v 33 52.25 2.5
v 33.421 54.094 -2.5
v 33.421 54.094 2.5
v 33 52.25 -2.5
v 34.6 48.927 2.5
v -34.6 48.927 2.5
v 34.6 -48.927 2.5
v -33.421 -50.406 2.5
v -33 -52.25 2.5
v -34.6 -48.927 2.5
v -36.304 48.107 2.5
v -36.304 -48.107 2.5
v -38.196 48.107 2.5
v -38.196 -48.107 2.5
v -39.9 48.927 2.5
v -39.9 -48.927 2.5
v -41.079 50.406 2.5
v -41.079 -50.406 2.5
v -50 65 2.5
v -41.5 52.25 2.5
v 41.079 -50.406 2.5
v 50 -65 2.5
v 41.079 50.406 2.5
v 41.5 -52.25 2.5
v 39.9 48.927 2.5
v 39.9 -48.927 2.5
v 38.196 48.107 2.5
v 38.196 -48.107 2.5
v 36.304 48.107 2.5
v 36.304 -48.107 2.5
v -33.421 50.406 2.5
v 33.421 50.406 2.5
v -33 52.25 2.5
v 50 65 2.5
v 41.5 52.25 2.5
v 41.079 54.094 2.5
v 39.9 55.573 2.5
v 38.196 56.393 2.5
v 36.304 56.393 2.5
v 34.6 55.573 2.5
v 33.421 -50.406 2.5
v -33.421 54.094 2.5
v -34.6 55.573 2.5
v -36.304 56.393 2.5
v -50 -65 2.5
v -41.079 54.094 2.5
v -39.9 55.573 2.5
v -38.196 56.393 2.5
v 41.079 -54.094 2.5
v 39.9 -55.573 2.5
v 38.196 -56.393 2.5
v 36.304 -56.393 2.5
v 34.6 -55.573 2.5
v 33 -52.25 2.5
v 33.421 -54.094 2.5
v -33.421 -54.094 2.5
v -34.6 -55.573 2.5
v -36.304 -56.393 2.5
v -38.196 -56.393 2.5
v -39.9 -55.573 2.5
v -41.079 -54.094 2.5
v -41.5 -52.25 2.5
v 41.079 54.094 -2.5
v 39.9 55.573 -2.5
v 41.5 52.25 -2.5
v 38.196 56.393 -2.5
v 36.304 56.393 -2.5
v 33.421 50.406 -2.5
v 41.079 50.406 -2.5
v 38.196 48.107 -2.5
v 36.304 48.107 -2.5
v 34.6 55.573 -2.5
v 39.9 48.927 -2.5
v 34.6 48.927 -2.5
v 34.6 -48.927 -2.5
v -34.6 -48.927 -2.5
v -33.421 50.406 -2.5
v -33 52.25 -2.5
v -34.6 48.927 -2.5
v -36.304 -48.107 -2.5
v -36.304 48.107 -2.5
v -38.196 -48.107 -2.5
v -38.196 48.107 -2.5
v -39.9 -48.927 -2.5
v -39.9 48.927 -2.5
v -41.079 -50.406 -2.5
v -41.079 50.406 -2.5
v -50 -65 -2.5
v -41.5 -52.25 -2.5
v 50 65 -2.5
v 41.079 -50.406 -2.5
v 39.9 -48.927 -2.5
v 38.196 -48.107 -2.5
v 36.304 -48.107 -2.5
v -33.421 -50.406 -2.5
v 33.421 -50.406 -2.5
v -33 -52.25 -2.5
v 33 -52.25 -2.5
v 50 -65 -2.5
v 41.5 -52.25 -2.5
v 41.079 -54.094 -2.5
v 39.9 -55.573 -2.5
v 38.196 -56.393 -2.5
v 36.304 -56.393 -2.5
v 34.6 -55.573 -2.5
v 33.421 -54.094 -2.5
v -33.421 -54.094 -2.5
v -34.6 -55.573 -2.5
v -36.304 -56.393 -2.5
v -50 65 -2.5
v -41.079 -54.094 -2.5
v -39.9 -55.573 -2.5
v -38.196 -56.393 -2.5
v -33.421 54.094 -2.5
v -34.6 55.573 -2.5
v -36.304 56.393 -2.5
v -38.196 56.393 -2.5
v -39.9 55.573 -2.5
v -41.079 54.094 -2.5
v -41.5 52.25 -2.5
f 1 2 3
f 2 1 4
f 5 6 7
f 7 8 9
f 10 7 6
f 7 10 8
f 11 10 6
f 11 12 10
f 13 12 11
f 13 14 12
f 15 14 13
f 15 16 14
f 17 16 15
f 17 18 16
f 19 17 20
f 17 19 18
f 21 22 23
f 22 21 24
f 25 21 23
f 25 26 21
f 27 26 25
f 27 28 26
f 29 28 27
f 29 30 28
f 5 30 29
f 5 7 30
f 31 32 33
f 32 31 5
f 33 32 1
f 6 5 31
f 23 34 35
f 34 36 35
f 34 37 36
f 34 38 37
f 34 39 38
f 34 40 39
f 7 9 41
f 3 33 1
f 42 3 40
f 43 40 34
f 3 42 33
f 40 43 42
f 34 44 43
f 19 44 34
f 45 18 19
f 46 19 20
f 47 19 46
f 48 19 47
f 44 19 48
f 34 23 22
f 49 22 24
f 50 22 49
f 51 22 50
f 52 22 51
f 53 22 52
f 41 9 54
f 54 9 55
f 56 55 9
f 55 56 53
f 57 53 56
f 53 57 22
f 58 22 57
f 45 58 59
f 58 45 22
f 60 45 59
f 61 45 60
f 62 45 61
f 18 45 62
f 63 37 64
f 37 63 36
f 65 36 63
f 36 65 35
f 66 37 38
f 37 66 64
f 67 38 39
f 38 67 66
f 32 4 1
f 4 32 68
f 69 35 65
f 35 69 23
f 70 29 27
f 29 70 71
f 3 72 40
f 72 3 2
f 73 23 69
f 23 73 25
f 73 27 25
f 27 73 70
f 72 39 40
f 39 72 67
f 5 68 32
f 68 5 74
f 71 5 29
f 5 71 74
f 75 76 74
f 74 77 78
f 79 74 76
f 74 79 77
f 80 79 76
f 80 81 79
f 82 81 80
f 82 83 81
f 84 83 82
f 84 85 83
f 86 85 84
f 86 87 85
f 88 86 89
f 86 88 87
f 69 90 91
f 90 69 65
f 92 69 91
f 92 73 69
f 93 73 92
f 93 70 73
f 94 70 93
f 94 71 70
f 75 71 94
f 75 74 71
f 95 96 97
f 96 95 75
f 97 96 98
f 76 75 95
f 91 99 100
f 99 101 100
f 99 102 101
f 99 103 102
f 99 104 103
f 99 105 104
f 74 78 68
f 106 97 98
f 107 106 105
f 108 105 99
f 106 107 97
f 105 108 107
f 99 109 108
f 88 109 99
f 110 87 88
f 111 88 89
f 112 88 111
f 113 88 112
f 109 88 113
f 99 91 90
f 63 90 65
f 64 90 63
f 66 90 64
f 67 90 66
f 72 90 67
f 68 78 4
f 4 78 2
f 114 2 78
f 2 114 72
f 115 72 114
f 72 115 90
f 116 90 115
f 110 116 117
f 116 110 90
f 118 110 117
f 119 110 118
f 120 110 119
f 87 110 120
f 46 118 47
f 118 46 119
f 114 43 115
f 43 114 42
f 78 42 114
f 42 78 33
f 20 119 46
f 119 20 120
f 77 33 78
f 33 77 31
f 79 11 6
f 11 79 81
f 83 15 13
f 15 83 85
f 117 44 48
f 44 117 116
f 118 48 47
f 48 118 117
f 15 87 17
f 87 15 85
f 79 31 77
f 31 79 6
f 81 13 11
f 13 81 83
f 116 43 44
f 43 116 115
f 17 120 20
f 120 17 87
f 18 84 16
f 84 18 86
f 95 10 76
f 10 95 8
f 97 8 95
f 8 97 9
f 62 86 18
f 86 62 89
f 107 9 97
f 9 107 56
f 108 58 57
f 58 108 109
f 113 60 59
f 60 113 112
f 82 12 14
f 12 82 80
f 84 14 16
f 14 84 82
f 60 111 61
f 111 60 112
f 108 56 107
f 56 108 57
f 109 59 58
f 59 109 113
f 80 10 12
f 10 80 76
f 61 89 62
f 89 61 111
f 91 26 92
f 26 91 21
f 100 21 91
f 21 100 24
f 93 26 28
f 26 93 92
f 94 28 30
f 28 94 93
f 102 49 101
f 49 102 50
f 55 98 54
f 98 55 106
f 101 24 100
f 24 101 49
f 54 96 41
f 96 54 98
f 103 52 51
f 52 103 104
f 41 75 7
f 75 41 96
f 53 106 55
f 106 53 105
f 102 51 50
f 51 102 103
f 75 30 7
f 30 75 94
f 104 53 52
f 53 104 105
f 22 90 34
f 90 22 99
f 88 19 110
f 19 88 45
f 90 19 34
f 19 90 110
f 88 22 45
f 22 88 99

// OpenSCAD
// Generated by SolidPython 1.1.3 on 2023-10-18 15:46:59


difference() {
	cube(center = true, size = [100, 130.0000000000, 5]);
	union() {
		translate(v = [37.2500000000, 52.2500000000]) {
			cylinder(center = true, h = 5, r = 4.2500000000);
		}
		translate(v = [-37.2500000000, 52.2500000000]) {
			cylinder(center = true, h = 5, r = 4.2500000000);
		}
		translate(v = [-37.2500000000, -52.2500000000]) {
			cylinder(center = true, h = 5, r = 4.2500000000);
		}
		translate(v = [37.2500000000, -52.2500000000]) {
			cylinder(center = true, h = 5, r = 4.2500000000);
		}
	}
}
/***********************************************
*********      SolidPython code:      **********
************************************************
 
import solid
import numbers
import pudb
from solid.utils import *
import viewscad
import subprocess
import os
import os.path as osp
import math
import sys

chamfer_extrude=solid.import_scad("./chamfer_extrude.scad")
chamfer_extrude=chamfer_extrude.chamfer_extrude
r = viewscad.Renderer(width=800, height=800)

def debug(model,f_name,path="/home/ts/code/projects/mfd/designs/debug"):
    solid.scad_render_to_file(model,osp.join(path,f_name)+".scad")
#generate position list of wells using offset from center
wells_pos_from_center_4 = lambda offset: [[-offset,offset],
                                        [offset, offset],
                                        [-offset, -offset],
                                        [offset, -offset]]
#wells_pos_from_center_2 = lambda offset: [[0,offset],
#                                        [0, -offset]]
wells_pos_from_center_2 = lambda offset: [[offset,0],
                                        [-offset,0]]

def make_well(dims,shape=None,height=None,dxf=False):
    def circle_cylinder():
        if dxf or (height is None):
            well = solid.circle(r=dims, segments=64)
        else:
            well = solid.cylinder(r=dims, h=height, segments=64, center = True)
        return well
    if dims is None:
        sys.exit("radius needs to be a number")
    if isinstance(dims, numbers.Number):
        well =circle_cylinder()
    elif len(dims)==1:
        if isinstance(dims[1], numbers.Number):
            well =circle_cylinder()
        else:
            sys.exit("radius needs to be a number")
    elif len(dims)==2:
        well = solid.square(dims,center = True)
    elif len(dims)==3:
        well = solid.cube(dims, center = True)
    return well

def wells_top_bottom(center_gap,device_dims=None,shape=None,height=None, positions = None, dxf = False,well_shape=None):
    if well_shape == None:
        well_shape = make_well(device_dims,shape=shape,height=height,dxf=dxf)
    wells = []
    if positions is None:
        offset = radius+radius/2.0
        positions = wells_pos_from_center_2(offset)
    if dxf or (height is None):
        height = 0
    for position in positions:
        if dxf:
            wells.append(solid.translate([position[0],position[1]])(well_shape))
        else:
            wells.append(solid.translate([position[0],position[1],height/2.0])(well_shape))
    return  union()(*wells)

#place wells in four corners 
def four_corner(radius,height=None, positions = None, dxf = False):
    #if well pos not specified set
    #to equally spaced by half radius
    if positions is None:
        offset = radius+radius/2.0
        positions = wells_pos_from_center_4(offset)
    if dxf or (height is None):
        height = 0
    #make wells at positions with specified radius and height
    wells = []
    for position in positions:
        #make circle if making dxf
        if dxf:
            well_shape = solid.circle(r=radius, segments=64)
            well_shape = solid.translate([position[0],position[1]])(well_shape)
        #if stl make cylinder
        else:
            well_shape = solid.cylinder(r=radius, h=height, segments=64, center = True)
            well_shape = solid.translate([position[0],position[1],height/2.0])(well_shape)
        wells.append(well_shape)
    return  union()(*wells)

#generate channels 
def make_channels(length,width,height=0,num_chans=1,max_chans=None,spacing=None, dxf = False,
                  rotate_channels=False):
    if dxf or (height is None):
        height = 0
    #if channel gap not defined, is equal to
    if spacing is None: spacing = width
    #calculate number of channels if fitting max num within given width
    if not max_chans is None:
        import math
        num_chans = math.floor((max_chans-spacing)/(width+spacing))
    #get total width of channel section  
    total_width = (width*num_chans)+(spacing*(num_chans-1))

    #make template channel
    #if rotate_channels: width, length = length, width
    if dxf:
        channel_t = solid.square([length,width],center = True)
    else:
        channel_t = solid.cube([length,width,height], center = True)

    #if number channels is even, offset the first channel to center its gap
    if num_chans % 2 == 0: centering = -(width/2.0+spacing/2.0)
    else: centering = 0
    #move template channel up to align bottom at z = 0 
    #and offset center if necessary
    if dxf:
        channel_t = solid.translate([0,centering])(channel_t)
    else:
        channel_t = solid.translate([0,centering,height/2.0])(channel_t)

    #if rotate_channels: length,width = width,length
    #start making the channels
    channels = []
    for i in range(num_chans):
        #if i=0 there is no translation
        #if i=1, we make the first channel adjacent to second
        direction = i

        #if i>=1, we add channels alternating left and right
        if i >= 1:
            direction = -(i/2.0)
            if i % 2 == 1: direction = (-direction)+0.5
                
        #make channel at right position and add it to channel list
        translation_coords = [0,direction*(width+spacing)]
        #if rotate_channels: translation_coords = [direction*(width+spacing),0]
        if dxf:
            channel = solid.translate(translation_coords)(channel_t)
        else:
            channel = solid.translate([*translation_coords,0])(channel_t)
        channels.append(channel)
    
    #group all channels as one object
    channels = union()(*channels)
    #compute the x,y,z dimensions in order to pass as arguments 
    #for construction of other parts of device (such as the chambers)
    measurements = {'x':(length/2.0,-length/2.0),
                    'y':(total_width/2.0,-total_width/2.0)}
    if not dxf:
        measurements['z'] = (height,0)
    if rotate_channels:
        channels = solid.rotate(90)(channels)
        measurements['x'],measurements['y']=measurements['y'],measurements['x']
    return channels,measurements

def make_chambers(msrs,height=None,extra=0,len_until=None,width=None, dxf = False):
    #computes x,y,z length
    total = lambda x : abs(x[0]) + abs(x[1])
    
    #if specific height if specified
    #otherwise use same height as channels
    if dxf:
        pass
    elif not height is None:
        msrs['z'] = (height,0)
    else:
        msrs['z'] = (0,0)
        
    #make copy of measurements from channels to modify chamber dimensions 
    #and add length to chambers as specified
    chamber_dims = msrs.copy()
    #calculate length of chamber to reach specified offset
    if not len_until is None:
        chamber_len = len_until-(msrs['x'][0])
    #or add specified length to channel length (if not specified, adds 0)
    else:
        chamber_len = msrs['x'][0]+extra
    #set the chamber length based 
    chamber_dims['x'] = (chamber_len/2.0,-(chamber_len/2.0))
    #compute final dimensions of chamber
    if not width is None:
        chamber_dims['y'] = (width/2.0,-width/2.0)
    chamber_dims = [total(size) for size in chamber_dims.values()]
        
    #calculate chamber translation offset to place adjacent to channels
    chamber_trslt = msrs['x'][0]+(chamber_len/2.0)
    #compute chamber translation coordinates to align with channels
    #x = 1 moves chamber above channels
    #x = -1 moves chamber below channels
    if dxf:
        trslt = lambda x : [x*(chamber_trslt),0]
    else:
        trslt = lambda x : [x*(chamber_trslt),0,msrs['z'][0]/2.0]
    
    #function to make chamber at top or at bottom 
    if dxf:
        move = lambda x : solid.translate(trslt(x))(solid.square(chamber_dims, center = True) )
    else:
        move = lambda x : solid.translate(trslt(x))(solid.cube(chamber_dims,center = True))
    #make top and bottom chambers and return them as grouped
    top = move(1)
    bottom = move(-1)
    #chambers=solid.rotate(90)(solid.union()(top,bottom))
    chambers=(solid.union()(top,bottom))

    return chambers

#create alignment features 
def alignment_features(unit,dims,grid_size, mask_size = None, alignment = "hollow", units_from_center = (2.5,2.5), corner_len=None):
    width = grid_size[0]*dims[0]
    length = grid_size[1]*dims[1]
    if mask_size is None and corner_len is None:
        corner_len = (dims[0] + dims[1]) /2 / 8
    corner = lambda thickness_div : solid.union()( solid.square([corner_len,corner_len/thickness_div],center=False), solid.square([corner_len/thickness_div,corner_len],center=False) )
    
    def make_full(thickness_div):
        thickness = corner_len/thickness_div
        tr = solid.translate([0, 0, 0 ])(solid.rotate(180)(corner(thickness_div)))
        tr = solid.translate([thickness/2,thickness/2,0])(tr)
        bl = solid.translate([0, 0, 0 ])(solid.rotate(0)(corner(thickness_div)))
        bl = solid.translate([-thickness/2,-thickness/2,0])(bl)
        return solid.union()(tr,bl)
    
    def make_hollow(thickness_div):
        thickness = corner_len/(thickness_div/2)
        inner = make_full(thickness_div)
        outer = make_full(thickness_div/2)
        hollow = outer - inner 
        return hollow
    
    center = (width /2 , length/2)
    mask_pos = lambda x,y : (center[0] + x*(float(units_from_center[0])*dims[0]), center[1] + y*(float(units_from_center[1])*dims[1]))
    positions = []
    positions.append(mask_pos(1,0))
    positions.append(mask_pos(0,1))
    positions.append(mask_pos(-1,0))
    positions.append(mask_pos(0,-1))
    make_mask = lambda mtype : make_hollow(8) if mtype == "hollow" else make_full(8)
    masks = [ solid.translate([*position,0])(make_mask(alignment)) for position in positions]
    
    solid.scad_render_to_file(solid.union()(*masks),"./designs/open_chamber/masks.scad")
    #return unit - solid.union()(*masks)
    return solid.union()(*masks,unit)

def create_outline(thickness, array, dims, grid_size,):
    width = grid_size[0]*dims[0] + thickness *2
    length = grid_size[1]*dims[1] + thickness *2
    outer = solid.translate([-thickness, -thickness,0])(solid.square([width, length]))
    return outer-array

def create_wall(wall_thickness, outline_thickness, dims, grid_size, wall_height = 2000, dxf = False):
    inner_width = grid_size[0]*dims[0] + outline_thickness *2
    inner_length = grid_size[1]*dims[1] + outline_thickness *2
    outer_width = inner_width + wall_thickness * 2
    outer_length = inner_length + wall_thickness * 2
    outer_pos_x = -outline_thickness-wall_thickness
    outer_pos_y = -outline_thickness-wall_thickness
    inner_pos_x = -outline_thickness
    inner_pos_y = -outline_thickness
    if dxf:
        inner_wall = solid.translate([inner_pos_x,
                                      inner_pos_y,
                                      0])(solid.square([inner_width, inner_length]))
        outer_wall = solid.translate([outer_pos_x,
                                      outer_pos_y,
                                      0])(solid.square([outer_width, outer_length]))

        return outer_wall-inner_wall
    else:
        inner_wall = solid.translate([inner_pos_x,
                                      inner_pos_y,
                                      0])(solid.cube([inner_width, inner_length,wall_height]))
        outer_wall = solid.translate([outer_pos_x,
                                      outer_pos_y,
                                      0])(solid.cube([outer_width, outer_length,wall_height]))

        return outer_wall-inner_wall, {'wall_height': wall_height,
                                       'wall_thickness': wall_thickness,
                                       'inner_width':inner_width,
                                       'inner_length': inner_length,
                                       'outer_width': outer_width,
                                       'outer_length': outer_length,
                                       'outer_pos_x' : outer_pos_x,
                                       'outer_pos_y' : outer_pos_y,
                                       'inner_pos_x' : inner_pos_x,
                                       'inner_pos_y' : inner_pos_y}

def create_thicker_wall(wall_thickness, outer_wall_offset, wall_dims, dims, grid_size, height_start = .2, height_end=2, dxf = False):
    addon_wall,thicker_wall_dims = create_wall(wall_thickness, outer_wall_offset, dims, grid_size, wall_height=height_end-height_start, dxf = False)
    addon_wall = solid.translate([0,0,height_start])(addon_wall)

    thicker_wall_dims['wall_height'] = height_end
    thicker_wall_dims['wall_thickness'] = wall_dims['wall_thickness'] + wall_thickness
    return addon_wall, thicker_wall_dims
 
def add_lock_to_wall(wall,wall_dims,y_offset = 0,cut_ratio=0.7,L_length=3, gap_ratio=0.05, axis="x",width_ratio=1/2):
    # Makes L shape
    def make_L(max_length,length_thickness,max_width,width_thickness,height,y_offset):
        length = solid.cube([max_length,length_thickness,height])
        width = solid.cube([width_thickness,max_width,height])
        width = solid.translate([max_length-(width_thickness),0,0])(width)
        L = solid.union()(width,length)
        debug(L,"L")
        if axis == "x":
            L = solid.rotate(-90)(L)
            L = solid.translate([0,max_length,0])(L)
        else:
            L = solid.rotate(-180)(L)
            L = solid.translate([max_length,max_width,0])(L)
        return solid.translate([0,0,y_offset])(L)
    
    lock_length = L_length
    lock_width = wall_dims['wall_thickness']*width_ratio
    lock_length_thickness = lock_width/2
    lock_width_thickness = lock_width/2
    L_lock = make_L(lock_length,lock_length_thickness,lock_width,lock_width_thickness, wall_dims['wall_height']-y_offset, y_offset)
    
    margin_space = lock_length - lock_length*(1-gap_ratio)
    key_length = lock_length-margin_space
    key_length_thickness = lock_length_thickness-(margin_space*2)
    key_width = lock_width-(margin_space*2)
    key_width_thickness = lock_width_thickness-(margin_space*2)
    L_key = make_L(key_length,key_length_thickness,key_width,key_width_thickness, wall_dims['wall_height']-y_offset, y_offset)
    L_key = solid.translate([margin_space,margin_space,0])(L_key)
    L = solid.union()(L_lock,L_key)
    debug(L,"L")
    
    #Make cube to be used as negative to split frame in a half
    #Can choose if making left or right negative, specify ratio of split
    def make_negative(right,cut_ratio):
        if axis == "x":
            if right:
                length = wall_dims['outer_length']*(1-cut_ratio)
                pos_x = wall_dims['outer_pos_x']+(wall_dims['outer_length']*cut_ratio)
            else:
                length = wall_dims['outer_length']*(cut_ratio)
                pos_x = wall_dims['outer_pos_x'] 
            negative = solid.cube([wall_dims['outer_width'],length, wall_dims['wall_height']])
            negative = solid.translate([wall_dims['outer_pos_y'],pos_x,0])(negative)
        else:
            if right:
                length = wall_dims['outer_width']*(1-cut_ratio)
                pos_x = wall_dims['outer_pos_y']+(wall_dims['outer_width']*cut_ratio)
            else:
                length = wall_dims['outer_width']*(cut_ratio)
                pos_x = wall_dims['outer_pos_y'] 
            negative = solid.cube([length,wall_dims['outer_length'], wall_dims['wall_height']])
            negative = solid.translate([pos_x,wall_dims['outer_pos_x'],0])(negative)
        return negative, pos_x, length 
                      
    #Make negatives
    negative_right, right_half_pos_x, right_half_length = make_negative(True,cut_ratio)
    negative_left, left_half_pos_x, right_half_length = make_negative(False,cut_ratio)
    #Make halves
    left_half = solid.difference()(wall,negative_right)
    right_half = solid.difference()(wall,negative_left)
    def place_L(L, L_length,L_width):
        #Place L on top wall       
        offset_to_center = (wall_dims['wall_thickness']-L_width)/2
        if axis == "x":
            y_pos_top = (wall_dims['outer_pos_y'] +
                    wall_dims['outer_width'] - 
                    L_width - offset_to_center)
            top_L = solid.translate([y_pos_top,
                                     right_half_pos_x-(L_length),
                                     0])(L)
            #Place L on bottom wall       
            y_pos_bottom = wall_dims['outer_pos_y']+offset_to_center
            bottom_L = solid.translate([y_pos_bottom,
                                        right_half_pos_x-L_length,
                                        0])(L)
        else:
            y_pos_top = (wall_dims['outer_pos_x'] +
                    wall_dims['outer_length'] -
                    (L_width+offset_to_center))
            top_L = solid.translate([right_half_pos_x-L_length,
                                     y_pos_top,
                                     0])(L)
            #Place L on bottom wall       
            y_pos_bottom = wall_dims['outer_pos_y']+offset_to_center
            bottom_L = solid.translate([right_half_pos_x-L_length,
                                        y_pos_bottom,
                                        0])(L)
        return bottom_L, top_L
    #Make complimentary L pieces through union and differences
    #Make Lock
    bottom_L_lock, top_L_lock = place_L(L_lock,L_length,lock_width)
    left_half = solid.difference()(left_half,bottom_L_lock)
    left_half = solid.difference()(left_half,top_L_lock)
    #Make Key
    bottom_L_key, top_L_key = place_L(L_key,L_length,lock_width)
    right_half = solid.union()(right_half,bottom_L_key)
    right_half = solid.union()(right_half,top_L_key)
    return left_half, right_half


#build a row x col grid of containment units
def make_unit_array(unit,dims,grid_size, dxf = False, alignment = None, mask_size = None,
                    units_from_center = None,alignment_offset=None, alignment_mark_size=1):
    units = []
    for col in range(grid_size[1]):
        for row in range(grid_size[0]):
            if dxf:
                units.append(solid.translate([row*dims[0],col*dims[1]])(unit))
            else:
                units.append(solid.translate([row*dims[0],col*dims[1],dims[2]/2.0])(unit))
    array = solid.union()(*units)
    if (not alignment is None) and dxf:
        if not alignment_offset is None:
            array = solid.translate([alignment_offset[0],alignment_offset[1]])(array)
        array = alignment_features(array,dims, grid_size, alignment = alignment, mask_size = None, units_from_center = units_from_center,corner_len=alignment_mark_size)
        if not alignment_offset is None:
            array = solid.translate([-alignment_offset[0],-alignment_offset[1]])(array)
    return array


def make_taylor(wells_pos = wells_pos_from_center_4(2.25), well_rad = 1.5 ,
                well_height = 2, chan_w = 0.01, chan_l = 1, chan_h = 0.010 ,
                chan_gap = 0.040, max_chans = None,num_chans=100, chamber_height  = 0.100,
                columns = 1, rows = 1, chamber_len_until=2.25, add_channels = True, add_wells = True, 
                add_chambers = True, save_path = "./", alignment = None, units_from_center = 2,
                mask_size = None, render_stl = False, outline_thickness = 0.050, dxf = True,
                wall_height = 15, wall_thickness = 0.95, casing_x=9, casing_y=9, casing_z=0,rotate_units=0):

    dims = [casing_x, casing_y, casing_z]
    wells = four_corner(well_rad,well_height, dxf = dxf, positions = wells_pos)
    debug(wells,"wells")
    channels, msrs = make_channels(chan_l,chan_w,chan_h,dxf=dxf, spacing = chan_gap, max_chans=max_chans,num_chans=num_chans)
    debug(channels,"channels")
    chambers = make_chambers(msrs,dxf = dxf, height=chamber_height,len_until=chamber_len_until)
    debug(chambers,"chambers")

    #add together and render
    device_parts = []
    if add_channels:
        device_parts.append(channels)
    if add_wells:
        device_parts.append(wells)
    if add_chambers:
        device_parts.append(chambers)
    device=union()(*device_parts)
    device = rotate(rotate_units)(device)

    device=solid.translate([dims[0]/2.0,dims[1]/2.0,0])(device)
    channels = rotate(rotate_units)(channels)
    channels=solid.translate([dims[0]/2,dims[1]/2,0])(channels)
    chambers_wells = union()(wells,chambers)
    chambers_wells = rotate(rotate_units)(chambers_wells)
    chambers_wells=solid.translate([dims[0]/2,dims[1]/2,0])(chambers_wells)

    file_name = str(rows)+'x'+str(columns)+'_units_'
    grid_size = [rows,columns]

    if alignment:
        alignment="full"
    device = make_unit_array(device,dims,grid_size, dxf=dxf, alignment = alignment,
                                 units_from_center = units_from_center)
    channels = make_unit_array(channels,dims,grid_size, dxf=dxf, alignment = alignment,
                                 units_from_center = units_from_center)
    if alignment=="full":
        alignment="hollow"

    chambers_wells = make_unit_array(chambers_wells,dims,grid_size, dxf=dxf, alignment = alignment,
                                 units_from_center =units_from_center)

    def save_model(model,prefix):
        model_fname = os.path.abspath(save_path+prefix+"_"+file_name+".scad")
        solid.scad_render_to_file(model,model_fname)
        return model_fname

    wells_fname = save_model(wells,"wells")
    channels_fname = save_model(channels,"channels")
    device_fname = save_model(device,"device")
    chambers_wells_fname = save_model(chambers_wells,"chambers_wells")
    return (chambers_wells,chambers_wells_fname), (channels,channels_fname), (device,device_fname)

def make_device(design='open',rows=8,columns=6,wells_pos = 4.5,well_offset=3.2, well_rad=3.2,well_height=0.1,
                chan_l=1,chan_w=0.01,chan_h=0.01,chan_gap=0.015,num_chans=101,dxf=True,save_path="./designs/open_chamber/",
                casing_x=9.0,casing_y=18.0,casing_z=0,rotate_units=90,units_from_center=(3,1),chamber_len_until=4.5,
                chamber_width=None,alignment=True, add_wells=True, add_channels=True,add_chambers=True,well_shape=None):

    dims = [casing_x, casing_y, casing_z]
    if design == "open":
        wells_pos=wells_pos_from_center_2(wells_pos)
        wells = wells_top_bottom(well_offset*2,device_dims=well_rad,height=well_height, dxf = dxf, positions = wells_pos,well_shape=well_shape)
    elif design == "closed":
        wells_pos=wells_pos_from_center_4(wells_pos)
        debug(wells,"wells")
        wells = four_corner(well_offset,well_height,device_dims=well_rad, dxf = dxf, positions = wells_pos)
    else:
        print(design+" is not a valid design.\n Choose valid design: 'open' or 'closed'")
        exit()
    wells = rotate(rotate_units)(wells)
    wells=solid.translate([dims[0]/2,dims[1]/2,0])(wells)
    debug(wells,"wells")

    channels, msrs = make_channels(chan_l,chan_w,chan_h,dxf=dxf, spacing = chan_gap, num_chans=num_chans,rotate_channels=False)
    channels = rotate(rotate_units)(channels)
    channels=solid.translate([dims[0]/2,dims[1]/2,0])(channels)

    chambers=make_chambers(msrs,height=None,extra=0,len_until=chamber_len_until, width=chamber_width,dxf = dxf)
    chambers = rotate(rotate_units)(chambers)
    chambers=solid.translate([dims[0]/2,dims[1]/2,0])(chambers)

    device_parts = []
    if add_channels:
        device_parts.append(channels)
    if add_wells:
        device_parts.append(wells)
    if add_chambers:
        device_parts.append(chambers)
    device = union()(*device_parts)
    #device = rotate(rotate_units)(device)
    #device=solid.translate([dims[0]/2.0,dims[1]/2.0,0])(device)

    chambers_wells = []
    if add_chambers:
        chambers_wells.append(chambers)
    if add_wells:
        chambers_wells.append(wells)
    chambers_wells = union()(*chambers_wells)
    #chambers_wells = union()(wells,chambers)
    #chambers_wells = rotate(rotate_units)(chambers_wells)
    #chambers_wells=solid.translate([dims[0]/2,dims[1]/2,0])(chambers_wells)

    file_name = str(rows)+'x'+str(columns)+'_units_'

    grid_size = [rows,columns]
    if alignment:
        alignment="full"
    device = make_unit_array(device,dims,grid_size, dxf=dxf, alignment = alignment,
                                 units_from_center = units_from_center)
    channels = make_unit_array(channels,dims,grid_size, dxf=dxf, alignment = alignment,
                                 units_from_center = units_from_center)
    if alignment=="full":
        alignment="hollow"

    chambers_wells = make_unit_array(chambers_wells,dims,grid_size, dxf=dxf, alignment = alignment,
                                 units_from_center =units_from_center)

    def save_model(model,prefix):
        model_fname = os.path.abspath(save_path+prefix+"_"+file_name+".scad")
        solid.scad_render_to_file(model,model_fname)
        return model_fname

    wells_fname = save_model(wells,"wells")
    channels_fname = save_model(channels,"channels")
    device_fname = save_model(device,"device")
    chambers_wells_fname = save_model(chambers_wells,"chambers_wells")
    return (chambers_wells,chambers_wells_fname), (channels,channels_fname), (device,device_fname)


def make_open_chamber(rows=8,columns=6,wells_pos = wells_pos_from_center_2(4.5), well_rad=3.2,well_height=0.1,
                      chan_l=1,chan_w=0.01,chan_h=0.01,chan_gap=0.015,num_chans=101,dxf=True,save_path="./designs/open_chamber/",
                      casing_x=9.0,casing_y=18.0,casing_z=0,rotate_units=90,units_from_center=(3,1),chamber_len_until=4.5,
                      chamber_width=None,alignment=True, add_wells=True, add_channels=True,add_chambers=True,well_shape=None):

    dims = [casing_x, casing_y, casing_z]
    wells = wells_top_bottom(well_rad,height=well_height, dxf = dxf, positions = wells_pos, well_shape=well_shape)
    channels, msrs = make_channels(chan_l,chan_w,chan_h,dxf=dxf, spacing = chan_gap, num_chans=num_chans,rotate_channels=False)
    chambers=make_chambers(msrs,height=None,extra=0,len_until=chamber_len_until, width=chamber_width,dxf = dxf)
    debug(chambers,"chambers")
    device_parts = []
    if add_channels:
        device_parts.append(channels)
    if add_wells:
        device_parts.append(wells)
    if add_chambers:
        device_parts.append(chambers)
    device = union()(*device_parts)
    device = rotate(rotate_units)(device)
    device=solid.translate([dims[0]/2.0,dims[1]/2.0,0])(device)
    channels = rotate(rotate_units)(channels)
    channels=solid.translate([dims[0]/2,dims[1]/2,0])(channels)
    chambers_wells = union()(wells,chambers)
    chambers_wells = rotate(rotate_units)(chambers_wells)
    chambers_wells=solid.translate([dims[0]/2,dims[1]/2,0])(chambers_wells)

    file_name = str(rows)+'x'+str(columns)+'_units_'

    grid_size = [rows,columns]
    if alignment:
        alignment="full"
    device = make_unit_array(device,dims,grid_size, dxf=dxf, alignment = alignment,
                                 units_from_center = units_from_center)
    channels = make_unit_array(channels,dims,grid_size, dxf=dxf, alignment = alignment,
                                 units_from_center = units_from_center)
    if alignment=="full":
        alignment="hollow"

    chambers_wells = make_unit_array(chambers_wells,dims,grid_size, dxf=dxf, alignment = alignment,
                                 units_from_center =units_from_center)

    def save_model(model,prefix):
        model_fname = os.path.abspath(save_path+prefix+"_"+file_name+".scad")
        solid.scad_render_to_file(model,model_fname)
        return model_fname

    wells_fname = save_model(wells,"wells")
    channels_fname = save_model(channels,"channels")
    device_fname = save_model(device,"device")
    chambers_wells_fname = save_model(chambers_wells,"chambers_wells")
    return (chambers_wells,chambers_wells_fname), (channels,channels_fname), (device,device_fname)

def to_dxf(scad_path):
    dxf_path = scad_path.replace(".scad",".dxf")
    subprocess.call(["openscad", "-o", dxf_path, scad_path])
    import ezdxf
    temp_dxf = ezdxf.readfile(dxf_path)
    temp_dxf.saveas(dxf_path)

#def make_walls(diameter,thickness,grid_size,dims,height=20,segments=256,make_inner=True):
#    wafer_wall_out = solid.cylinder(r=diameter/2,h=height, segments=segments)
#    wafer_wall_in = solid.cylinder(r=(diameter/2-thickness),h=height, segments=segments)
#    wafer_wall = solid.difference()(wafer_wall_out,wafer_wall_in)
#    wafer_wall = solid.translate([grid_size[1]*dims[1]/2.0,grid_size[0]*dims[0]/2.0])(wafer_wall)
#
#    vertical_wall_length = grid_size[1]*dims[1]
#    horizontal_wall_length = grid_size[0]*dims[0]
#    vertical_wall = solid.cube([vertical_wall_length,thickness,height],center = True)
#    vertical_wall = solid.translate([vertical_wall_length/2,0,height/2])(vertical_wall)
#    horizontal_wall = solid.cube([thickness,horizontal_wall_length,height],center = True)
#    horizontal_wall = solid.translate([0,vertical_wall_length/2,height/2])(horizontal_wall)
#    walls = []
#    walls.append(horizontal_wall)
#    walls.append(vertical_wall)
#    for col in range(grid_size[1]):
#        if col == grid_size[1]-1: 
#            walls.append(solid.translate([0,(col+1)*dims[1]])(vertical_wall))
#        elif col > 0 and col < grid_size[1]-1 and make_inner==True:
#            walls.append(solid.translate([0,(col+1)*dims[1]])(vertical_wall))
#    for row in range(grid_size[0]):
#        if row == grid_size[0]-1: 
#            walls.append(solid.translate([(row+1)*dims[0],0])(horizontal_wall))
#        elif row > 0 and row < grid_size[0]-1 and make_inner==True:
#            walls.append(solid.translate([(row+1)*dims[0],0])(horizontal_wall))
#    walls = union()(*walls)
#    wafer_walls = union()(walls,wafer_wall)
#    return walls,wafer_wall,wafer_walls

def make_walls(diameter,thickness,grid_size,dims,height=20,segments=256,make_inner=True,padx=0,pady=0):
    wafer_wall_out = solid.cylinder(r=diameter/2,h=height, segments=segments)
    wafer_wall_in = solid.cylinder(r=(diameter/2-thickness),h=height, segments=segments)
    wafer_wall = solid.difference()(wafer_wall_out,wafer_wall_in)
    wafer_wall = solid.translate([grid_size[1]*dims[1]/2.0,grid_size[0]*dims[0]/2.0])(wafer_wall)

    vertical_wall_length = grid_size[0]*dims[0]+padx
    horizontal_wall_length = grid_size[1]*dims[1]+pady
    vertical_wall = solid.cube([vertical_wall_length,thickness,height],center = True)
    vertical_wall = solid.translate([vertical_wall_length/2-pady/2,-padx/2,height/2])(vertical_wall)
    horizontal_wall = solid.cube([thickness,horizontal_wall_length,height],center = True)
    horizontal_wall = solid.translate([-pady/2,horizontal_wall_length/2-padx/2,height/2])(horizontal_wall)
    walls = []
    walls.append(horizontal_wall)
    walls.append(vertical_wall)
    for col in range(grid_size[1]):
        if col == grid_size[1]-1: 
            walls.append(solid.translate([0,(col+1)*dims[1]+pady])(vertical_wall))
        elif col > 0 and col < grid_size[1]-1 and make_inner==True:
            walls.append(solid.translate([0,(col+1)*dims[1]])(vertical_wall))
    for row in range(grid_size[0]):
        if row == grid_size[0]-1: 
            walls.append(solid.translate([(row+1)*dims[0]+padx,0])(horizontal_wall))
        elif row > 0 and row < grid_size[0]-1 and make_inner==True:
            walls.append(solid.translate([(row+1)*dims[0],0])(horizontal_wall))
    walls = union()(*walls)
    wafer_walls = union()(walls,wafer_wall)
    return walls,wafer_wall,wafer_walls

def save_model(model,base_path,base_name,dxf=True):
    if not os.path.exists(base_path):
        os.makedirs(base_path)
    dxf_path=osp.join(base_path,base_name+".scad")
    solid.scad_render_to_file(model,osp.join(dxf_path))
    if dxf:
        to_dxf(dxf_path)

def make_wafer(diameter,flat_len,thickness):
    wafer = solid.cylinder(r1=diameter/2,r2=diameter/2,h=thickness,segments=512,)()
    x_start_flat=(flat_len/2)
    y_start_flat = math.sqrt(((diameter/2)**2) - (x_start_flat**2) )
    height_delete_flat=diameter/2-y_start_flat
    flat_delete = solid.cube([flat_len,height_delete_flat,thickness],center=False)()
    flat_delete = solid.translate([-flat_len/2,y_start_flat,0])(flat_delete)
    wafer = solid.difference()(wafer,flat_delete)
    wafer = solid.rotate(90)(wafer)
    return wafer

def add_wafer_to_mask(wafer_size,flat_len,mask,grid_size,dims,wafer_line_thickness=0.1,outer_mask_thickness=5,alignment_offset=None):
    def make_wafer_mask(wafer_size,flat_len):
        wafer_mask = make_wafer(wafer_size,flat_len,1)
        wafer_mask = solid.projection()(wafer_mask)
        wafer_mask = solid.translate([grid_size[0]*dims[0]/2.0,grid_size[1]*dims[1]/2.0])(wafer_mask)
        if not alignment_offset is None:
            wafer_mask = solid.translate([-alignment_offset[0],-alignment_offset[1]])(wafer_mask)
        return wafer_mask

    inner_wafer_line_mask = make_wafer_mask(wafer_size-wafer_line_thickness/2,flat_len)
    outer_wafer_line_mask = make_wafer_mask(wafer_size+wafer_line_thickness/2,flat_len)
    outer_wafer_mask = make_wafer_mask(wafer_size+outer_mask_thickness,flat_len)
    outer_wafer_mask = solid.difference()(outer_wafer_mask,outer_wafer_line_mask)
    wafer_mask = solid.union()(outer_wafer_mask,inner_wafer_line_mask)

    return solid.difference()(wafer_mask,mask)

def make_posts(post_shape,post_height):
    posts = solid.linear_extrude(height=post_height)(post_shape)
    return posts

def make_wafer_empty(diameter,flat_len,thickness,margin,notch_len=20,notch_height=5,oversize=1.01):
    diameter*=oversize
    flat_len*=oversize
    wafer = make_wafer(diameter,flat_len,thickness)
    holder = solid.cylinder(r1=diameter/2+margin,r2=diameter/2+margin,h=thickness,segments=512)()
    holder = solid.difference()(holder,wafer)

    x_start_flat=(flat_len/2)
    y_start_flat = math.sqrt(((diameter/2)**2) - (x_start_flat**2) )
    height_delete_flat=diameter/2-y_start_flat
    notch = solid.cube([notch_len,notch_height,thickness],center=False)()
    notch = solid.translate([-notch_len/2,y_start_flat,0])(notch)
    notch = solid.rotate(90)(notch)
    return solid.difference()(holder,notch)

def wafer_print_calibration(diameter,thickness,height,z_offset):
    circles = []
    radii = []
    radii.append(diameter/2.0*0.8)
    radii.append(diameter/2.0*0.6)
    radii.append(diameter/2.0*0.4)
    radii.append(diameter/2.0*0.2)
    for radius in radii:
        inner = solid.cylinder(r1=radius-(thickness/2.0),r2=radius-(thickness/2.0),h=thickness,segments=512,)()
        outer = solid.cylinder(r1=radius+(thickness/2.0),r2=radius+(thickness/2.0),h=thickness,segments=512,)()
        diff = solid.difference()(outer,inner)
        circles.append(diff)
    circles = solid.union()(*circles)
    circles = solid.translate([0,0,z_offset])(circles)
    return circles

def make_rack(wells,dims,grid_size,alignment_offset,rack_x,rack_y,rack_thickness,bolt_width,add_bolts=True):

    #get X and Y dimensions of gride of pipette tips
    X_len = dims[0]*grid_size[0]
    Y_len = dims[1]*grid_size[1]
    #make rack
    rack = solid.cube([rack_x,rack_y,rack_thickness],center=True)

    if add_bolts:
    #add bolt holes
        bolt_hole=solid.cylinder(r=bolt_width/2,h=rack_thickness,center=True)()
        bolt_holes = []
        bolt_holes.append(solid.translate([rack_x/2-1.5*bolt_width,rack_y/2-1.5*bolt_width])(bolt_hole))
        bolt_holes.append(solid.translate([-rack_x/2+1.5*bolt_width,rack_y/2-1.5*bolt_width])(bolt_hole))
        bolt_holes.append(solid.translate([-rack_x/2+1.5*bolt_width,-rack_y/2+1.5*bolt_width])(bolt_hole))
        bolt_holes.append(solid.translate([rack_x/2-1.5*bolt_width,-rack_y/2+1.5*bolt_width])(bolt_hole))
        bolt_holes = solid.union()(*bolt_holes)
        rack=solid.difference()(rack,bolt_holes)
    rack_support = rack

    #center rack with pipette holes
    rack = solid.translate([0,0,rack_thickness/2])(rack)
    rack = solid.translate([X_len/2,Y_len/2])(rack)
    rack = solid.translate([-alignment_offset[0],-alignment_offset[1]])(rack)
    wells = solid.linear_extrude(height=rack_thickness)(wells)
    rack = solid.difference()(rack,wells)
    return rack, rack_support

def make_pillar(wells,dims,grid_size,alignment_offset,rack_x,rack_y,pillar_height,rack_thickness,bolt_width,add_bolts=True,taper_angle=1,bolt_position_corner=1.5):

    #get X and Y dimensions of gride of pipette tips
    X_len = dims[0]*grid_size[0]
    Y_len = dims[1]*grid_size[1]
    #make rack
    rack = solid.cube([rack_x,rack_y,rack_thickness],center=True)
    
    if add_bolts:
    #add bolt holes
        bolt_hole=solid.cylinder(r=bolt_width/2,h=rack_thickness,center=True)()
        bolt_holes = []
        bolt_holes.append(solid.translate([rack_x/2-bolt_position_corner*bolt_width,rack_y/2-bolt_position_corner*bolt_width])(bolt_hole))
        bolt_holes.append(solid.translate([-rack_x/2+bolt_position_corner*bolt_width,rack_y/2-bolt_position_corner*bolt_width])(bolt_hole))
        bolt_holes.append(solid.translate([-rack_x/2+bolt_position_corner*bolt_width,-rack_y/2+bolt_position_corner*bolt_width])(bolt_hole))
        bolt_holes.append(solid.translate([rack_x/2-bolt_position_corner*bolt_width,-rack_y/2+bolt_position_corner*bolt_width])(bolt_hole))
        bolt_holes = solid.union()(*bolt_holes)
        rack=solid.difference()(rack,bolt_holes)
    rack_support = rack

    #center rack with pipette holes
    #rack = solid.translate([0,0,-rack_thickness])(rack)
    rack = solid.translate([X_len/2,Y_len/2])(rack)
    rack = solid.translate([-alignment_offset[0],-alignment_offset[1]])(rack)
    if not taper_angle == 0:
        wells=chamfer_extrude(pillar_height,taper_angle,segments=20)(wells)
    else:
        wells = solid.linear_extrude(height=pillar_height)(wells)
    rack = solid.union()(rack,wells)
    return rack, rack_support

def deg_taper_len(height,deg):
    if not deg == 0:
        return height*math.tan(math.radians(deg))
    else:
        return 0









 
 
************************************************/
